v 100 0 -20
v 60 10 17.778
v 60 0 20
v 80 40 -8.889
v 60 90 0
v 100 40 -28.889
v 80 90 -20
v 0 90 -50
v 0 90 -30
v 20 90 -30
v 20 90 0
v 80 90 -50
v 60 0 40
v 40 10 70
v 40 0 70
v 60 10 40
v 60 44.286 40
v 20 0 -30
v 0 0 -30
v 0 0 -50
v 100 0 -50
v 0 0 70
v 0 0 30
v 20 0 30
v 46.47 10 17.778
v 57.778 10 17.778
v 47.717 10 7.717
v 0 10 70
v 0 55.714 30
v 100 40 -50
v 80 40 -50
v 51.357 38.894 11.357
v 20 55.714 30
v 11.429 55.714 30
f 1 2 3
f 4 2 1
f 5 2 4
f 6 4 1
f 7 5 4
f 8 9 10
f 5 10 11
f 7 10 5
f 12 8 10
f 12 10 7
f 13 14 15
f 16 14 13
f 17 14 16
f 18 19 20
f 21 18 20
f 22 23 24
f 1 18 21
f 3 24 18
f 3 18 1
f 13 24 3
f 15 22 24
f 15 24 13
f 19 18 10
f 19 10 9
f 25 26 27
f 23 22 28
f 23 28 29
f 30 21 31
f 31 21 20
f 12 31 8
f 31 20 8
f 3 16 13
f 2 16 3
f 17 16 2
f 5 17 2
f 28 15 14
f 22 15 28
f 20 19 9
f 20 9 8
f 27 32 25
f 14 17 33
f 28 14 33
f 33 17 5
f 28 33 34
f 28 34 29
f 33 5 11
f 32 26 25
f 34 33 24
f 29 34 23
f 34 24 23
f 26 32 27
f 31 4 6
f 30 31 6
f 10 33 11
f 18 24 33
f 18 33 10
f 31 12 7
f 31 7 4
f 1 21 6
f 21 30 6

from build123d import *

# Parameters (mm, degrees)
SKETCH1_W            = 80
SKETCH1_H            = 50
BOSS_EXTRUDE1_DEPTH  = 90
SKETCH2_W            = 20
SKETCH2_H            = 30
CUT_EXTRUDE1_DEPTH   = 90
BOSS_EXTRUDE2_DEPTH  = 20
CUT_EXTRUDE2_DEPTH   = 127
BOSS_EXTRUDE10_DEPTH = 38
BOSS_EXTRUDE16_DEPTH = 38
BOSS_EXTRUDE17_DEPTH = 38
SKETCH13_W           = 30
SKETCH13_H           = 50
CUT_EXTRUDE4_DEPTH   = 38
SKETCH14_W           = 100
SKETCH14_H           = 90
CUT_EXTRUDE5_DEPTH   = 38
SKETCH15_W           = 106.776830175
SKETCH15_H           = 78.518203409
CUT_EXTRUDE6_DEPTH   = 38
BOSS_EXTRUDE18_DEPTH = 10
CUT_EXTRUDE7_DEPTH   = 10
BOSS_EXTRUDE19_DEPTH = 112
SKETCH19_W           = 80
SKETCH19_H           = 90
CUT_EXTRUDE8_DEPTH   = 112
SKETCH20_W           = 107.666200856
SKETCH20_H           = 176.074092784
CUT_EXTRUDE9_DEPTH   = 112
SKETCH21_W           = 20
SKETCH21_H           = 60
CUT_EXTRUDE10_DEPTH  = 112
SKETCH27_W           = 22.568644797
SKETCH27_H           = 9.839278278
BOSS_EXTRUDE22_DEPTH = 20
BOSS_EXTRUDE24_DEPTH = 91
SKETCH32_W           = 16.460176991
SKETCH32_H           = 60
CUT_EXTRUDE13_DEPTH  = 101
CUT_EXTRUDE14_DEPTH  = 101
BOSS_EXTRUDE25_DEPTH = 5
SKETCH35_W           = 20
SKETCH35_H           = 60
CUT_EXTRUDE15_DEPTH  = 152
BOSS_EXTRUDE27_DEPTH = 20
SKETCH42_W           = 25
SKETCH42_H           = 10
BOSS_EXTRUDE29_DEPTH = 20
BOSS_EXTRUDE30_DEPTH = 20
BOSS_EXTRUDE31_DEPTH = 20
SKETCH46_W           = 60
SKETCH46_H           = 50
CUT_EXTRUDE19_DEPTH  = 20
CUT_EXTRUDE20_DEPTH  = 20
CUT_EXTRUDE21_DEPTH  = 10


with BuildPart() as part:
    # Sketch1 → Boss-Extrude1 (new body)
    with BuildSketch(Plane(origin=(0, 0, 0), x_dir=(1, 0, 0), z_dir=(0, 1, 0))):
        with Locations((40, 25)):
            Rectangle(SKETCH1_W, SKETCH1_H)
    extrude(amount=BOSS_EXTRUDE1_DEPTH)

    # Sketch2 → Cut-Extrude1 (cut)
    with BuildSketch(Plane(origin=(0, 90, 0), x_dir=(1, 0, 0), z_dir=(0, 1, 0))):
        with Locations((10, 15)):
            Rectangle(SKETCH2_W, SKETCH2_H)
    extrude(amount=-CUT_EXTRUDE1_DEPTH, mode=Mode.SUBTRACT)

    # Sketch3 → Boss-Extrude2 (add)
    with BuildSketch(Plane(origin=(80, 0, 0), x_dir=(0, 0, -1), z_dir=(1, 0, 0))):
        Polygon((20, 0), (50, 0), (50, 40), (30, 40), align=None)
    extrude(amount=BOSS_EXTRUDE2_DEPTH)

    # Sketch4 → Cut-Extrude2 (cut)
    with BuildSketch(Plane(origin=(0, 90, 0), x_dir=(1, 0, 0), z_dir=(0, 1, 0))):
        Polygon((60, 0), (80, 20), (80, 0), align=None)
    extrude(amount=-CUT_EXTRUDE2_DEPTH, mode=Mode.SUBTRACT)

    # Sketch7 → Boss-Extrude10 (add)
    with BuildSketch(Plane(origin=(38.787878788, 9.696969697, 38.787878788), x_dir=(0.717740563, -0.168880132, -0.675520529), z_dir=(0.696310624, 0.174077656, 0.696310624))):
        Polygon((29.554023164, -4.850712501), (85.284466846, 4.850712501), (85.284466846, 46.081768757), align=None)
    extrude(amount=-BOSS_EXTRUDE10_DEPTH)

    # Sketch10 → Boss-Extrude16 (add)
    with BuildSketch(Plane(origin=(39.036144578, 8.674698795, 39.036144578), x_dir=(0.715575428, -0.15153362, -0.68190129), z_dir=(0.698535473, 0.155230105, 0.698535473))):
        Polygon((57.246034218, 92.195444573), (15.321732688, 85.687530838), (29.296499865, -4.338609156), (85.195568572, 4.338609156), (85.195568572, 46.23657111), align=None)
    extrude(amount=-BOSS_EXTRUDE16_DEPTH)

    # Sketch11 → Boss-Extrude17 (add)
    with BuildSketch(Plane(origin=(100, 0, 0), x_dir=(0, 0, -1), z_dir=(1, 0, 0))):
        Polygon((20, 0), (29.088944068, 40.900248307), (30, 40), align=None)
    extrude(amount=-BOSS_EXTRUDE17_DEPTH)

    # Sketch13 → Cut-Extrude4 (cut)
    with BuildSketch(Plane(origin=(80, 0, 0), x_dir=(0, 0, -1), z_dir=(1, 0, 0))):
        with Locations((35, 65)):
            Rectangle(SKETCH13_W, SKETCH13_H)
    extrude(amount=CUT_EXTRUDE4_DEPTH, mode=Mode.SUBTRACT)

    # Sketch14 → Cut-Extrude5 (cut)
    with BuildSketch(Plane(origin=(0, 0, -50), x_dir=(-1, 0, 0), z_dir=(0, 0, -1))):
        with Locations((-50, 45)):
            Rectangle(SKETCH14_W, SKETCH14_H)
    extrude(amount=CUT_EXTRUDE5_DEPTH, mode=Mode.SUBTRACT)

    # Sketch15 → Cut-Extrude6 (cut)
    with BuildSketch(Plane.XZ):
        with Locations((53.388415088, -10.740898295)):
            Rectangle(SKETCH15_W, SKETCH15_H)
    extrude(amount=CUT_EXTRUDE6_DEPTH, mode=Mode.SUBTRACT)

    # Sketch16 → Boss-Extrude18 (add)
    with BuildSketch(Plane(origin=(0, 0, 0), x_dir=(-1, 0, 0), z_dir=(0, -1, 0))):
        Polygon((-60, -20), (-60, -40), (-40, -70), (0, -70), (0, -30), (-20, -30), (-20, 0), (-40, 0), align=None)
    extrude(amount=-BOSS_EXTRUDE18_DEPTH)

    # Sketch17 → Cut-Extrude7 (cut)
    with BuildSketch(Plane(origin=(0, 39.026548673, 44.601769912), x_dir=(-1, 0, 0), z_dir=(0, -0.658504608, -0.752576695))):
        Polygon((-20, 67.731902524), (0, -38.569555604), (-40, -38.569555604), (-60, 67.731902524), align=None)
    extrude(amount=-CUT_EXTRUDE7_DEPTH, mode=Mode.SUBTRACT)

    # Sketch18 → Boss-Extrude19 (add)
    with BuildSketch(Plane(origin=(0, 39.026548673, 44.601769912), x_dir=(-1, 0, 0), z_dir=(0, -0.658504608, -0.752576695))):
        Polygon((-20, 67.731902524), (-60, 67.731902524), (-40, -38.569555604), (0, -38.569555604), align=None)
    extrude(amount=BOSS_EXTRUDE19_DEPTH)

    # Sketch19 → Cut-Extrude8 (cut)
    with BuildSketch(Plane(origin=(0, 0, -50), x_dir=(-1, 0, 0), z_dir=(0, 0, -1))):
        with Locations((-40, 45)):
            Rectangle(SKETCH19_W, SKETCH19_H)
    extrude(amount=CUT_EXTRUDE8_DEPTH, mode=Mode.SUBTRACT)

    # Sketch20 → Cut-Extrude9 (cut)
    with BuildSketch(Plane.XZ):
        with Locations((53.833100428, -18.037046392)):
            Rectangle(SKETCH20_W, SKETCH20_H)
    extrude(amount=CUT_EXTRUDE9_DEPTH, mode=Mode.SUBTRACT)

    # Sketch21 → Cut-Extrude10 (cut)
    with BuildSketch(Plane(origin=(0, 0, 0), x_dir=(-1, 0, 0), z_dir=(0, -1, 0))):
        with Locations((-10, 0)):
            Rectangle(SKETCH21_W, SKETCH21_H)
    extrude(amount=-CUT_EXTRUDE10_DEPTH, mode=Mode.SUBTRACT)

    # Sketch27 → Boss-Extrude22 (add)
    with BuildSketch(Plane(origin=(60, 0, 0), x_dir=(0, 0, -1), z_dir=(1, 0, 0))):
        with Locations((-28.715677602, 4.919639139)):
            Rectangle(SKETCH27_W, SKETCH27_H)
    extrude(amount=-BOSS_EXTRUDE22_DEPTH)

    # Sketch31 → Boss-Extrude24 (add)
    with BuildSketch(Plane(origin=(0, 39.026548673, 44.601769912), x_dir=(-1, 0, 0), z_dir=(0, -0.658504608, -0.752576695))):
        Polygon((0, -38.569555604), (-11.428571429, 22.174134755), (0, 22.174134755), align=None)
    extrude(amount=BOSS_EXTRUDE24_DEPTH)

    # Sketch32 → Cut-Extrude13 (cut)
    with BuildSketch(Plane(origin=(0, 0, 0), x_dir=(-1, 0, 0), z_dir=(0, -1, 0))):
        with Locations((-11.769911504, 0)):
            Rectangle(SKETCH32_W, SKETCH32_H)
    extrude(amount=-CUT_EXTRUDE13_DEPTH, mode=Mode.SUBTRACT)

    # Sketch33 → Cut-Extrude14 (cut)
    with BuildSketch(Plane(origin=(7.008547009, -0.992360638, 0.868315559), x_dir=(0.120555065, -0.017069744, -0.992559872), z_dir=(0.982757328, -0.13915148, 0.121757545))):
        Polygon((-0.652056607, -49.430869531), (39.647779316, -2.565835787), (34.800706646, 1.602223376), (-58.135649667, 0), align=None)
    extrude(amount=-CUT_EXTRUDE14_DEPTH, mode=Mode.SUBTRACT)

    # Sketch34 → Boss-Extrude25 (add)
    with BuildSketch(Plane(origin=(0, 0, 0), x_dir=(-1, 0, 0), z_dir=(0, -1, 0))):
        Polygon((0, -58.571428571), (0, -30), (-3.539823009, -30), align=None)
        Polygon((0, 36.93877551), (0, 50), (-40, 50), (-40, -70), (0, -70), (0, -58.571428571), (-3.539823009, -30), (-20, -30), (-20, 30), (-10.973451327, 30), (-11.428571429, 33.673469388), align=None)
        Polygon((0, -30), (0, 30), (-10.973451327, 30), (-20, 30), (-20, -30), (-3.539823009, -30), align=None)
        Polygon((0, 30), (0, 36.93877551), (-11.428571429, 33.673469388), (-10.973451327, 30), align=None)
    extrude(amount=-BOSS_EXTRUDE25_DEPTH)

    # Sketch35 → Cut-Extrude15 (cut)
    with BuildSketch(Plane(origin=(0, 0, 0), x_dir=(-1, 0, 0), z_dir=(0, -1, 0))):
        with Locations((-10, 0)):
            Rectangle(SKETCH35_W, SKETCH35_H)
    extrude(amount=-CUT_EXTRUDE15_DEPTH, mode=Mode.SUBTRACT)

    # Sketch39 → Boss-Extrude27 (add)
    with BuildSketch(Plane(origin=(60, 0, 40), x_dir=(0.554700196, 0, -0.832050294), z_dir=(0.832050294, 0, 0.554700196))):
        Polygon((0, 10), (0, 40), (-36.055512755, 10), align=None)
    extrude(amount=-BOSS_EXTRUDE27_DEPTH)

    # Sketch42 → Boss-Extrude29 (add)
    with BuildSketch(Plane(origin=(60, 0, 0), x_dir=(0, 0, -1), z_dir=(1, 0, 0))):
        with Locations((-27.5, 5)):
            Rectangle(SKETCH42_W, SKETCH42_H)
    extrude(amount=-BOSS_EXTRUDE29_DEPTH)

    # Sketch43 → Boss-Extrude30 (add)
    with BuildSketch(Plane(origin=(60, 0, 0), x_dir=(0, 0, -1), z_dir=(1, 0, 0))):
        Polygon((-40, 10), (-17.777777778, 10), (0, 90), (-40, 40), align=None)
    extrude(amount=-BOSS_EXTRUDE30_DEPTH)

    # Sketch44 → Boss-Extrude31 (add)
    with BuildSketch(Plane(origin=(0, 39.026548673, 44.601769912), x_dir=(1, 0, 0), z_dir=(0, 0.658504608, 0.752576695))):
        Polygon((40, -38.569555604), (60, 67.731902524), (60, 3.762883474), align=None)
    extrude(amount=-BOSS_EXTRUDE31_DEPTH)

    # Sketch46 → Cut-Extrude19 (cut)
    with BuildSketch(Plane(origin=(0, 0, 0), x_dir=(-1, 0, 0), z_dir=(0, -1, 0))):
        with Locations((-30, -45)):
            Rectangle(SKETCH46_W, SKETCH46_H)
    extrude(amount=CUT_EXTRUDE19_DEPTH, mode=Mode.SUBTRACT)

    # Sketch47 → Cut-Extrude20 (cut)
    with BuildSketch(Plane(origin=(0, 0, -20), x_dir=(-1, 0, 0), z_dir=(0, 0, -1))):
        Polygon((-80, 90), (-80, 40), (-91.111111111, 40), align=None)
    extrude(amount=-CUT_EXTRUDE20_DEPTH, mode=Mode.SUBTRACT)

    # Sketch48 → Cut-Extrude21 (cut)
    with BuildSketch(Plane(origin=(60, 0, 40), x_dir=(0.554700196, 0, -0.832050294), z_dir=(0.832050294, 0, 0.554700196))):
        Polygon((0, 0), (0, 64.446209383), (-38.036246254, 32.223104692), (-36.055512755, 0), align=None)
    extrude(amount=CUT_EXTRUDE21_DEPTH, mode=Mode.SUBTRACT)


solid = part.part
